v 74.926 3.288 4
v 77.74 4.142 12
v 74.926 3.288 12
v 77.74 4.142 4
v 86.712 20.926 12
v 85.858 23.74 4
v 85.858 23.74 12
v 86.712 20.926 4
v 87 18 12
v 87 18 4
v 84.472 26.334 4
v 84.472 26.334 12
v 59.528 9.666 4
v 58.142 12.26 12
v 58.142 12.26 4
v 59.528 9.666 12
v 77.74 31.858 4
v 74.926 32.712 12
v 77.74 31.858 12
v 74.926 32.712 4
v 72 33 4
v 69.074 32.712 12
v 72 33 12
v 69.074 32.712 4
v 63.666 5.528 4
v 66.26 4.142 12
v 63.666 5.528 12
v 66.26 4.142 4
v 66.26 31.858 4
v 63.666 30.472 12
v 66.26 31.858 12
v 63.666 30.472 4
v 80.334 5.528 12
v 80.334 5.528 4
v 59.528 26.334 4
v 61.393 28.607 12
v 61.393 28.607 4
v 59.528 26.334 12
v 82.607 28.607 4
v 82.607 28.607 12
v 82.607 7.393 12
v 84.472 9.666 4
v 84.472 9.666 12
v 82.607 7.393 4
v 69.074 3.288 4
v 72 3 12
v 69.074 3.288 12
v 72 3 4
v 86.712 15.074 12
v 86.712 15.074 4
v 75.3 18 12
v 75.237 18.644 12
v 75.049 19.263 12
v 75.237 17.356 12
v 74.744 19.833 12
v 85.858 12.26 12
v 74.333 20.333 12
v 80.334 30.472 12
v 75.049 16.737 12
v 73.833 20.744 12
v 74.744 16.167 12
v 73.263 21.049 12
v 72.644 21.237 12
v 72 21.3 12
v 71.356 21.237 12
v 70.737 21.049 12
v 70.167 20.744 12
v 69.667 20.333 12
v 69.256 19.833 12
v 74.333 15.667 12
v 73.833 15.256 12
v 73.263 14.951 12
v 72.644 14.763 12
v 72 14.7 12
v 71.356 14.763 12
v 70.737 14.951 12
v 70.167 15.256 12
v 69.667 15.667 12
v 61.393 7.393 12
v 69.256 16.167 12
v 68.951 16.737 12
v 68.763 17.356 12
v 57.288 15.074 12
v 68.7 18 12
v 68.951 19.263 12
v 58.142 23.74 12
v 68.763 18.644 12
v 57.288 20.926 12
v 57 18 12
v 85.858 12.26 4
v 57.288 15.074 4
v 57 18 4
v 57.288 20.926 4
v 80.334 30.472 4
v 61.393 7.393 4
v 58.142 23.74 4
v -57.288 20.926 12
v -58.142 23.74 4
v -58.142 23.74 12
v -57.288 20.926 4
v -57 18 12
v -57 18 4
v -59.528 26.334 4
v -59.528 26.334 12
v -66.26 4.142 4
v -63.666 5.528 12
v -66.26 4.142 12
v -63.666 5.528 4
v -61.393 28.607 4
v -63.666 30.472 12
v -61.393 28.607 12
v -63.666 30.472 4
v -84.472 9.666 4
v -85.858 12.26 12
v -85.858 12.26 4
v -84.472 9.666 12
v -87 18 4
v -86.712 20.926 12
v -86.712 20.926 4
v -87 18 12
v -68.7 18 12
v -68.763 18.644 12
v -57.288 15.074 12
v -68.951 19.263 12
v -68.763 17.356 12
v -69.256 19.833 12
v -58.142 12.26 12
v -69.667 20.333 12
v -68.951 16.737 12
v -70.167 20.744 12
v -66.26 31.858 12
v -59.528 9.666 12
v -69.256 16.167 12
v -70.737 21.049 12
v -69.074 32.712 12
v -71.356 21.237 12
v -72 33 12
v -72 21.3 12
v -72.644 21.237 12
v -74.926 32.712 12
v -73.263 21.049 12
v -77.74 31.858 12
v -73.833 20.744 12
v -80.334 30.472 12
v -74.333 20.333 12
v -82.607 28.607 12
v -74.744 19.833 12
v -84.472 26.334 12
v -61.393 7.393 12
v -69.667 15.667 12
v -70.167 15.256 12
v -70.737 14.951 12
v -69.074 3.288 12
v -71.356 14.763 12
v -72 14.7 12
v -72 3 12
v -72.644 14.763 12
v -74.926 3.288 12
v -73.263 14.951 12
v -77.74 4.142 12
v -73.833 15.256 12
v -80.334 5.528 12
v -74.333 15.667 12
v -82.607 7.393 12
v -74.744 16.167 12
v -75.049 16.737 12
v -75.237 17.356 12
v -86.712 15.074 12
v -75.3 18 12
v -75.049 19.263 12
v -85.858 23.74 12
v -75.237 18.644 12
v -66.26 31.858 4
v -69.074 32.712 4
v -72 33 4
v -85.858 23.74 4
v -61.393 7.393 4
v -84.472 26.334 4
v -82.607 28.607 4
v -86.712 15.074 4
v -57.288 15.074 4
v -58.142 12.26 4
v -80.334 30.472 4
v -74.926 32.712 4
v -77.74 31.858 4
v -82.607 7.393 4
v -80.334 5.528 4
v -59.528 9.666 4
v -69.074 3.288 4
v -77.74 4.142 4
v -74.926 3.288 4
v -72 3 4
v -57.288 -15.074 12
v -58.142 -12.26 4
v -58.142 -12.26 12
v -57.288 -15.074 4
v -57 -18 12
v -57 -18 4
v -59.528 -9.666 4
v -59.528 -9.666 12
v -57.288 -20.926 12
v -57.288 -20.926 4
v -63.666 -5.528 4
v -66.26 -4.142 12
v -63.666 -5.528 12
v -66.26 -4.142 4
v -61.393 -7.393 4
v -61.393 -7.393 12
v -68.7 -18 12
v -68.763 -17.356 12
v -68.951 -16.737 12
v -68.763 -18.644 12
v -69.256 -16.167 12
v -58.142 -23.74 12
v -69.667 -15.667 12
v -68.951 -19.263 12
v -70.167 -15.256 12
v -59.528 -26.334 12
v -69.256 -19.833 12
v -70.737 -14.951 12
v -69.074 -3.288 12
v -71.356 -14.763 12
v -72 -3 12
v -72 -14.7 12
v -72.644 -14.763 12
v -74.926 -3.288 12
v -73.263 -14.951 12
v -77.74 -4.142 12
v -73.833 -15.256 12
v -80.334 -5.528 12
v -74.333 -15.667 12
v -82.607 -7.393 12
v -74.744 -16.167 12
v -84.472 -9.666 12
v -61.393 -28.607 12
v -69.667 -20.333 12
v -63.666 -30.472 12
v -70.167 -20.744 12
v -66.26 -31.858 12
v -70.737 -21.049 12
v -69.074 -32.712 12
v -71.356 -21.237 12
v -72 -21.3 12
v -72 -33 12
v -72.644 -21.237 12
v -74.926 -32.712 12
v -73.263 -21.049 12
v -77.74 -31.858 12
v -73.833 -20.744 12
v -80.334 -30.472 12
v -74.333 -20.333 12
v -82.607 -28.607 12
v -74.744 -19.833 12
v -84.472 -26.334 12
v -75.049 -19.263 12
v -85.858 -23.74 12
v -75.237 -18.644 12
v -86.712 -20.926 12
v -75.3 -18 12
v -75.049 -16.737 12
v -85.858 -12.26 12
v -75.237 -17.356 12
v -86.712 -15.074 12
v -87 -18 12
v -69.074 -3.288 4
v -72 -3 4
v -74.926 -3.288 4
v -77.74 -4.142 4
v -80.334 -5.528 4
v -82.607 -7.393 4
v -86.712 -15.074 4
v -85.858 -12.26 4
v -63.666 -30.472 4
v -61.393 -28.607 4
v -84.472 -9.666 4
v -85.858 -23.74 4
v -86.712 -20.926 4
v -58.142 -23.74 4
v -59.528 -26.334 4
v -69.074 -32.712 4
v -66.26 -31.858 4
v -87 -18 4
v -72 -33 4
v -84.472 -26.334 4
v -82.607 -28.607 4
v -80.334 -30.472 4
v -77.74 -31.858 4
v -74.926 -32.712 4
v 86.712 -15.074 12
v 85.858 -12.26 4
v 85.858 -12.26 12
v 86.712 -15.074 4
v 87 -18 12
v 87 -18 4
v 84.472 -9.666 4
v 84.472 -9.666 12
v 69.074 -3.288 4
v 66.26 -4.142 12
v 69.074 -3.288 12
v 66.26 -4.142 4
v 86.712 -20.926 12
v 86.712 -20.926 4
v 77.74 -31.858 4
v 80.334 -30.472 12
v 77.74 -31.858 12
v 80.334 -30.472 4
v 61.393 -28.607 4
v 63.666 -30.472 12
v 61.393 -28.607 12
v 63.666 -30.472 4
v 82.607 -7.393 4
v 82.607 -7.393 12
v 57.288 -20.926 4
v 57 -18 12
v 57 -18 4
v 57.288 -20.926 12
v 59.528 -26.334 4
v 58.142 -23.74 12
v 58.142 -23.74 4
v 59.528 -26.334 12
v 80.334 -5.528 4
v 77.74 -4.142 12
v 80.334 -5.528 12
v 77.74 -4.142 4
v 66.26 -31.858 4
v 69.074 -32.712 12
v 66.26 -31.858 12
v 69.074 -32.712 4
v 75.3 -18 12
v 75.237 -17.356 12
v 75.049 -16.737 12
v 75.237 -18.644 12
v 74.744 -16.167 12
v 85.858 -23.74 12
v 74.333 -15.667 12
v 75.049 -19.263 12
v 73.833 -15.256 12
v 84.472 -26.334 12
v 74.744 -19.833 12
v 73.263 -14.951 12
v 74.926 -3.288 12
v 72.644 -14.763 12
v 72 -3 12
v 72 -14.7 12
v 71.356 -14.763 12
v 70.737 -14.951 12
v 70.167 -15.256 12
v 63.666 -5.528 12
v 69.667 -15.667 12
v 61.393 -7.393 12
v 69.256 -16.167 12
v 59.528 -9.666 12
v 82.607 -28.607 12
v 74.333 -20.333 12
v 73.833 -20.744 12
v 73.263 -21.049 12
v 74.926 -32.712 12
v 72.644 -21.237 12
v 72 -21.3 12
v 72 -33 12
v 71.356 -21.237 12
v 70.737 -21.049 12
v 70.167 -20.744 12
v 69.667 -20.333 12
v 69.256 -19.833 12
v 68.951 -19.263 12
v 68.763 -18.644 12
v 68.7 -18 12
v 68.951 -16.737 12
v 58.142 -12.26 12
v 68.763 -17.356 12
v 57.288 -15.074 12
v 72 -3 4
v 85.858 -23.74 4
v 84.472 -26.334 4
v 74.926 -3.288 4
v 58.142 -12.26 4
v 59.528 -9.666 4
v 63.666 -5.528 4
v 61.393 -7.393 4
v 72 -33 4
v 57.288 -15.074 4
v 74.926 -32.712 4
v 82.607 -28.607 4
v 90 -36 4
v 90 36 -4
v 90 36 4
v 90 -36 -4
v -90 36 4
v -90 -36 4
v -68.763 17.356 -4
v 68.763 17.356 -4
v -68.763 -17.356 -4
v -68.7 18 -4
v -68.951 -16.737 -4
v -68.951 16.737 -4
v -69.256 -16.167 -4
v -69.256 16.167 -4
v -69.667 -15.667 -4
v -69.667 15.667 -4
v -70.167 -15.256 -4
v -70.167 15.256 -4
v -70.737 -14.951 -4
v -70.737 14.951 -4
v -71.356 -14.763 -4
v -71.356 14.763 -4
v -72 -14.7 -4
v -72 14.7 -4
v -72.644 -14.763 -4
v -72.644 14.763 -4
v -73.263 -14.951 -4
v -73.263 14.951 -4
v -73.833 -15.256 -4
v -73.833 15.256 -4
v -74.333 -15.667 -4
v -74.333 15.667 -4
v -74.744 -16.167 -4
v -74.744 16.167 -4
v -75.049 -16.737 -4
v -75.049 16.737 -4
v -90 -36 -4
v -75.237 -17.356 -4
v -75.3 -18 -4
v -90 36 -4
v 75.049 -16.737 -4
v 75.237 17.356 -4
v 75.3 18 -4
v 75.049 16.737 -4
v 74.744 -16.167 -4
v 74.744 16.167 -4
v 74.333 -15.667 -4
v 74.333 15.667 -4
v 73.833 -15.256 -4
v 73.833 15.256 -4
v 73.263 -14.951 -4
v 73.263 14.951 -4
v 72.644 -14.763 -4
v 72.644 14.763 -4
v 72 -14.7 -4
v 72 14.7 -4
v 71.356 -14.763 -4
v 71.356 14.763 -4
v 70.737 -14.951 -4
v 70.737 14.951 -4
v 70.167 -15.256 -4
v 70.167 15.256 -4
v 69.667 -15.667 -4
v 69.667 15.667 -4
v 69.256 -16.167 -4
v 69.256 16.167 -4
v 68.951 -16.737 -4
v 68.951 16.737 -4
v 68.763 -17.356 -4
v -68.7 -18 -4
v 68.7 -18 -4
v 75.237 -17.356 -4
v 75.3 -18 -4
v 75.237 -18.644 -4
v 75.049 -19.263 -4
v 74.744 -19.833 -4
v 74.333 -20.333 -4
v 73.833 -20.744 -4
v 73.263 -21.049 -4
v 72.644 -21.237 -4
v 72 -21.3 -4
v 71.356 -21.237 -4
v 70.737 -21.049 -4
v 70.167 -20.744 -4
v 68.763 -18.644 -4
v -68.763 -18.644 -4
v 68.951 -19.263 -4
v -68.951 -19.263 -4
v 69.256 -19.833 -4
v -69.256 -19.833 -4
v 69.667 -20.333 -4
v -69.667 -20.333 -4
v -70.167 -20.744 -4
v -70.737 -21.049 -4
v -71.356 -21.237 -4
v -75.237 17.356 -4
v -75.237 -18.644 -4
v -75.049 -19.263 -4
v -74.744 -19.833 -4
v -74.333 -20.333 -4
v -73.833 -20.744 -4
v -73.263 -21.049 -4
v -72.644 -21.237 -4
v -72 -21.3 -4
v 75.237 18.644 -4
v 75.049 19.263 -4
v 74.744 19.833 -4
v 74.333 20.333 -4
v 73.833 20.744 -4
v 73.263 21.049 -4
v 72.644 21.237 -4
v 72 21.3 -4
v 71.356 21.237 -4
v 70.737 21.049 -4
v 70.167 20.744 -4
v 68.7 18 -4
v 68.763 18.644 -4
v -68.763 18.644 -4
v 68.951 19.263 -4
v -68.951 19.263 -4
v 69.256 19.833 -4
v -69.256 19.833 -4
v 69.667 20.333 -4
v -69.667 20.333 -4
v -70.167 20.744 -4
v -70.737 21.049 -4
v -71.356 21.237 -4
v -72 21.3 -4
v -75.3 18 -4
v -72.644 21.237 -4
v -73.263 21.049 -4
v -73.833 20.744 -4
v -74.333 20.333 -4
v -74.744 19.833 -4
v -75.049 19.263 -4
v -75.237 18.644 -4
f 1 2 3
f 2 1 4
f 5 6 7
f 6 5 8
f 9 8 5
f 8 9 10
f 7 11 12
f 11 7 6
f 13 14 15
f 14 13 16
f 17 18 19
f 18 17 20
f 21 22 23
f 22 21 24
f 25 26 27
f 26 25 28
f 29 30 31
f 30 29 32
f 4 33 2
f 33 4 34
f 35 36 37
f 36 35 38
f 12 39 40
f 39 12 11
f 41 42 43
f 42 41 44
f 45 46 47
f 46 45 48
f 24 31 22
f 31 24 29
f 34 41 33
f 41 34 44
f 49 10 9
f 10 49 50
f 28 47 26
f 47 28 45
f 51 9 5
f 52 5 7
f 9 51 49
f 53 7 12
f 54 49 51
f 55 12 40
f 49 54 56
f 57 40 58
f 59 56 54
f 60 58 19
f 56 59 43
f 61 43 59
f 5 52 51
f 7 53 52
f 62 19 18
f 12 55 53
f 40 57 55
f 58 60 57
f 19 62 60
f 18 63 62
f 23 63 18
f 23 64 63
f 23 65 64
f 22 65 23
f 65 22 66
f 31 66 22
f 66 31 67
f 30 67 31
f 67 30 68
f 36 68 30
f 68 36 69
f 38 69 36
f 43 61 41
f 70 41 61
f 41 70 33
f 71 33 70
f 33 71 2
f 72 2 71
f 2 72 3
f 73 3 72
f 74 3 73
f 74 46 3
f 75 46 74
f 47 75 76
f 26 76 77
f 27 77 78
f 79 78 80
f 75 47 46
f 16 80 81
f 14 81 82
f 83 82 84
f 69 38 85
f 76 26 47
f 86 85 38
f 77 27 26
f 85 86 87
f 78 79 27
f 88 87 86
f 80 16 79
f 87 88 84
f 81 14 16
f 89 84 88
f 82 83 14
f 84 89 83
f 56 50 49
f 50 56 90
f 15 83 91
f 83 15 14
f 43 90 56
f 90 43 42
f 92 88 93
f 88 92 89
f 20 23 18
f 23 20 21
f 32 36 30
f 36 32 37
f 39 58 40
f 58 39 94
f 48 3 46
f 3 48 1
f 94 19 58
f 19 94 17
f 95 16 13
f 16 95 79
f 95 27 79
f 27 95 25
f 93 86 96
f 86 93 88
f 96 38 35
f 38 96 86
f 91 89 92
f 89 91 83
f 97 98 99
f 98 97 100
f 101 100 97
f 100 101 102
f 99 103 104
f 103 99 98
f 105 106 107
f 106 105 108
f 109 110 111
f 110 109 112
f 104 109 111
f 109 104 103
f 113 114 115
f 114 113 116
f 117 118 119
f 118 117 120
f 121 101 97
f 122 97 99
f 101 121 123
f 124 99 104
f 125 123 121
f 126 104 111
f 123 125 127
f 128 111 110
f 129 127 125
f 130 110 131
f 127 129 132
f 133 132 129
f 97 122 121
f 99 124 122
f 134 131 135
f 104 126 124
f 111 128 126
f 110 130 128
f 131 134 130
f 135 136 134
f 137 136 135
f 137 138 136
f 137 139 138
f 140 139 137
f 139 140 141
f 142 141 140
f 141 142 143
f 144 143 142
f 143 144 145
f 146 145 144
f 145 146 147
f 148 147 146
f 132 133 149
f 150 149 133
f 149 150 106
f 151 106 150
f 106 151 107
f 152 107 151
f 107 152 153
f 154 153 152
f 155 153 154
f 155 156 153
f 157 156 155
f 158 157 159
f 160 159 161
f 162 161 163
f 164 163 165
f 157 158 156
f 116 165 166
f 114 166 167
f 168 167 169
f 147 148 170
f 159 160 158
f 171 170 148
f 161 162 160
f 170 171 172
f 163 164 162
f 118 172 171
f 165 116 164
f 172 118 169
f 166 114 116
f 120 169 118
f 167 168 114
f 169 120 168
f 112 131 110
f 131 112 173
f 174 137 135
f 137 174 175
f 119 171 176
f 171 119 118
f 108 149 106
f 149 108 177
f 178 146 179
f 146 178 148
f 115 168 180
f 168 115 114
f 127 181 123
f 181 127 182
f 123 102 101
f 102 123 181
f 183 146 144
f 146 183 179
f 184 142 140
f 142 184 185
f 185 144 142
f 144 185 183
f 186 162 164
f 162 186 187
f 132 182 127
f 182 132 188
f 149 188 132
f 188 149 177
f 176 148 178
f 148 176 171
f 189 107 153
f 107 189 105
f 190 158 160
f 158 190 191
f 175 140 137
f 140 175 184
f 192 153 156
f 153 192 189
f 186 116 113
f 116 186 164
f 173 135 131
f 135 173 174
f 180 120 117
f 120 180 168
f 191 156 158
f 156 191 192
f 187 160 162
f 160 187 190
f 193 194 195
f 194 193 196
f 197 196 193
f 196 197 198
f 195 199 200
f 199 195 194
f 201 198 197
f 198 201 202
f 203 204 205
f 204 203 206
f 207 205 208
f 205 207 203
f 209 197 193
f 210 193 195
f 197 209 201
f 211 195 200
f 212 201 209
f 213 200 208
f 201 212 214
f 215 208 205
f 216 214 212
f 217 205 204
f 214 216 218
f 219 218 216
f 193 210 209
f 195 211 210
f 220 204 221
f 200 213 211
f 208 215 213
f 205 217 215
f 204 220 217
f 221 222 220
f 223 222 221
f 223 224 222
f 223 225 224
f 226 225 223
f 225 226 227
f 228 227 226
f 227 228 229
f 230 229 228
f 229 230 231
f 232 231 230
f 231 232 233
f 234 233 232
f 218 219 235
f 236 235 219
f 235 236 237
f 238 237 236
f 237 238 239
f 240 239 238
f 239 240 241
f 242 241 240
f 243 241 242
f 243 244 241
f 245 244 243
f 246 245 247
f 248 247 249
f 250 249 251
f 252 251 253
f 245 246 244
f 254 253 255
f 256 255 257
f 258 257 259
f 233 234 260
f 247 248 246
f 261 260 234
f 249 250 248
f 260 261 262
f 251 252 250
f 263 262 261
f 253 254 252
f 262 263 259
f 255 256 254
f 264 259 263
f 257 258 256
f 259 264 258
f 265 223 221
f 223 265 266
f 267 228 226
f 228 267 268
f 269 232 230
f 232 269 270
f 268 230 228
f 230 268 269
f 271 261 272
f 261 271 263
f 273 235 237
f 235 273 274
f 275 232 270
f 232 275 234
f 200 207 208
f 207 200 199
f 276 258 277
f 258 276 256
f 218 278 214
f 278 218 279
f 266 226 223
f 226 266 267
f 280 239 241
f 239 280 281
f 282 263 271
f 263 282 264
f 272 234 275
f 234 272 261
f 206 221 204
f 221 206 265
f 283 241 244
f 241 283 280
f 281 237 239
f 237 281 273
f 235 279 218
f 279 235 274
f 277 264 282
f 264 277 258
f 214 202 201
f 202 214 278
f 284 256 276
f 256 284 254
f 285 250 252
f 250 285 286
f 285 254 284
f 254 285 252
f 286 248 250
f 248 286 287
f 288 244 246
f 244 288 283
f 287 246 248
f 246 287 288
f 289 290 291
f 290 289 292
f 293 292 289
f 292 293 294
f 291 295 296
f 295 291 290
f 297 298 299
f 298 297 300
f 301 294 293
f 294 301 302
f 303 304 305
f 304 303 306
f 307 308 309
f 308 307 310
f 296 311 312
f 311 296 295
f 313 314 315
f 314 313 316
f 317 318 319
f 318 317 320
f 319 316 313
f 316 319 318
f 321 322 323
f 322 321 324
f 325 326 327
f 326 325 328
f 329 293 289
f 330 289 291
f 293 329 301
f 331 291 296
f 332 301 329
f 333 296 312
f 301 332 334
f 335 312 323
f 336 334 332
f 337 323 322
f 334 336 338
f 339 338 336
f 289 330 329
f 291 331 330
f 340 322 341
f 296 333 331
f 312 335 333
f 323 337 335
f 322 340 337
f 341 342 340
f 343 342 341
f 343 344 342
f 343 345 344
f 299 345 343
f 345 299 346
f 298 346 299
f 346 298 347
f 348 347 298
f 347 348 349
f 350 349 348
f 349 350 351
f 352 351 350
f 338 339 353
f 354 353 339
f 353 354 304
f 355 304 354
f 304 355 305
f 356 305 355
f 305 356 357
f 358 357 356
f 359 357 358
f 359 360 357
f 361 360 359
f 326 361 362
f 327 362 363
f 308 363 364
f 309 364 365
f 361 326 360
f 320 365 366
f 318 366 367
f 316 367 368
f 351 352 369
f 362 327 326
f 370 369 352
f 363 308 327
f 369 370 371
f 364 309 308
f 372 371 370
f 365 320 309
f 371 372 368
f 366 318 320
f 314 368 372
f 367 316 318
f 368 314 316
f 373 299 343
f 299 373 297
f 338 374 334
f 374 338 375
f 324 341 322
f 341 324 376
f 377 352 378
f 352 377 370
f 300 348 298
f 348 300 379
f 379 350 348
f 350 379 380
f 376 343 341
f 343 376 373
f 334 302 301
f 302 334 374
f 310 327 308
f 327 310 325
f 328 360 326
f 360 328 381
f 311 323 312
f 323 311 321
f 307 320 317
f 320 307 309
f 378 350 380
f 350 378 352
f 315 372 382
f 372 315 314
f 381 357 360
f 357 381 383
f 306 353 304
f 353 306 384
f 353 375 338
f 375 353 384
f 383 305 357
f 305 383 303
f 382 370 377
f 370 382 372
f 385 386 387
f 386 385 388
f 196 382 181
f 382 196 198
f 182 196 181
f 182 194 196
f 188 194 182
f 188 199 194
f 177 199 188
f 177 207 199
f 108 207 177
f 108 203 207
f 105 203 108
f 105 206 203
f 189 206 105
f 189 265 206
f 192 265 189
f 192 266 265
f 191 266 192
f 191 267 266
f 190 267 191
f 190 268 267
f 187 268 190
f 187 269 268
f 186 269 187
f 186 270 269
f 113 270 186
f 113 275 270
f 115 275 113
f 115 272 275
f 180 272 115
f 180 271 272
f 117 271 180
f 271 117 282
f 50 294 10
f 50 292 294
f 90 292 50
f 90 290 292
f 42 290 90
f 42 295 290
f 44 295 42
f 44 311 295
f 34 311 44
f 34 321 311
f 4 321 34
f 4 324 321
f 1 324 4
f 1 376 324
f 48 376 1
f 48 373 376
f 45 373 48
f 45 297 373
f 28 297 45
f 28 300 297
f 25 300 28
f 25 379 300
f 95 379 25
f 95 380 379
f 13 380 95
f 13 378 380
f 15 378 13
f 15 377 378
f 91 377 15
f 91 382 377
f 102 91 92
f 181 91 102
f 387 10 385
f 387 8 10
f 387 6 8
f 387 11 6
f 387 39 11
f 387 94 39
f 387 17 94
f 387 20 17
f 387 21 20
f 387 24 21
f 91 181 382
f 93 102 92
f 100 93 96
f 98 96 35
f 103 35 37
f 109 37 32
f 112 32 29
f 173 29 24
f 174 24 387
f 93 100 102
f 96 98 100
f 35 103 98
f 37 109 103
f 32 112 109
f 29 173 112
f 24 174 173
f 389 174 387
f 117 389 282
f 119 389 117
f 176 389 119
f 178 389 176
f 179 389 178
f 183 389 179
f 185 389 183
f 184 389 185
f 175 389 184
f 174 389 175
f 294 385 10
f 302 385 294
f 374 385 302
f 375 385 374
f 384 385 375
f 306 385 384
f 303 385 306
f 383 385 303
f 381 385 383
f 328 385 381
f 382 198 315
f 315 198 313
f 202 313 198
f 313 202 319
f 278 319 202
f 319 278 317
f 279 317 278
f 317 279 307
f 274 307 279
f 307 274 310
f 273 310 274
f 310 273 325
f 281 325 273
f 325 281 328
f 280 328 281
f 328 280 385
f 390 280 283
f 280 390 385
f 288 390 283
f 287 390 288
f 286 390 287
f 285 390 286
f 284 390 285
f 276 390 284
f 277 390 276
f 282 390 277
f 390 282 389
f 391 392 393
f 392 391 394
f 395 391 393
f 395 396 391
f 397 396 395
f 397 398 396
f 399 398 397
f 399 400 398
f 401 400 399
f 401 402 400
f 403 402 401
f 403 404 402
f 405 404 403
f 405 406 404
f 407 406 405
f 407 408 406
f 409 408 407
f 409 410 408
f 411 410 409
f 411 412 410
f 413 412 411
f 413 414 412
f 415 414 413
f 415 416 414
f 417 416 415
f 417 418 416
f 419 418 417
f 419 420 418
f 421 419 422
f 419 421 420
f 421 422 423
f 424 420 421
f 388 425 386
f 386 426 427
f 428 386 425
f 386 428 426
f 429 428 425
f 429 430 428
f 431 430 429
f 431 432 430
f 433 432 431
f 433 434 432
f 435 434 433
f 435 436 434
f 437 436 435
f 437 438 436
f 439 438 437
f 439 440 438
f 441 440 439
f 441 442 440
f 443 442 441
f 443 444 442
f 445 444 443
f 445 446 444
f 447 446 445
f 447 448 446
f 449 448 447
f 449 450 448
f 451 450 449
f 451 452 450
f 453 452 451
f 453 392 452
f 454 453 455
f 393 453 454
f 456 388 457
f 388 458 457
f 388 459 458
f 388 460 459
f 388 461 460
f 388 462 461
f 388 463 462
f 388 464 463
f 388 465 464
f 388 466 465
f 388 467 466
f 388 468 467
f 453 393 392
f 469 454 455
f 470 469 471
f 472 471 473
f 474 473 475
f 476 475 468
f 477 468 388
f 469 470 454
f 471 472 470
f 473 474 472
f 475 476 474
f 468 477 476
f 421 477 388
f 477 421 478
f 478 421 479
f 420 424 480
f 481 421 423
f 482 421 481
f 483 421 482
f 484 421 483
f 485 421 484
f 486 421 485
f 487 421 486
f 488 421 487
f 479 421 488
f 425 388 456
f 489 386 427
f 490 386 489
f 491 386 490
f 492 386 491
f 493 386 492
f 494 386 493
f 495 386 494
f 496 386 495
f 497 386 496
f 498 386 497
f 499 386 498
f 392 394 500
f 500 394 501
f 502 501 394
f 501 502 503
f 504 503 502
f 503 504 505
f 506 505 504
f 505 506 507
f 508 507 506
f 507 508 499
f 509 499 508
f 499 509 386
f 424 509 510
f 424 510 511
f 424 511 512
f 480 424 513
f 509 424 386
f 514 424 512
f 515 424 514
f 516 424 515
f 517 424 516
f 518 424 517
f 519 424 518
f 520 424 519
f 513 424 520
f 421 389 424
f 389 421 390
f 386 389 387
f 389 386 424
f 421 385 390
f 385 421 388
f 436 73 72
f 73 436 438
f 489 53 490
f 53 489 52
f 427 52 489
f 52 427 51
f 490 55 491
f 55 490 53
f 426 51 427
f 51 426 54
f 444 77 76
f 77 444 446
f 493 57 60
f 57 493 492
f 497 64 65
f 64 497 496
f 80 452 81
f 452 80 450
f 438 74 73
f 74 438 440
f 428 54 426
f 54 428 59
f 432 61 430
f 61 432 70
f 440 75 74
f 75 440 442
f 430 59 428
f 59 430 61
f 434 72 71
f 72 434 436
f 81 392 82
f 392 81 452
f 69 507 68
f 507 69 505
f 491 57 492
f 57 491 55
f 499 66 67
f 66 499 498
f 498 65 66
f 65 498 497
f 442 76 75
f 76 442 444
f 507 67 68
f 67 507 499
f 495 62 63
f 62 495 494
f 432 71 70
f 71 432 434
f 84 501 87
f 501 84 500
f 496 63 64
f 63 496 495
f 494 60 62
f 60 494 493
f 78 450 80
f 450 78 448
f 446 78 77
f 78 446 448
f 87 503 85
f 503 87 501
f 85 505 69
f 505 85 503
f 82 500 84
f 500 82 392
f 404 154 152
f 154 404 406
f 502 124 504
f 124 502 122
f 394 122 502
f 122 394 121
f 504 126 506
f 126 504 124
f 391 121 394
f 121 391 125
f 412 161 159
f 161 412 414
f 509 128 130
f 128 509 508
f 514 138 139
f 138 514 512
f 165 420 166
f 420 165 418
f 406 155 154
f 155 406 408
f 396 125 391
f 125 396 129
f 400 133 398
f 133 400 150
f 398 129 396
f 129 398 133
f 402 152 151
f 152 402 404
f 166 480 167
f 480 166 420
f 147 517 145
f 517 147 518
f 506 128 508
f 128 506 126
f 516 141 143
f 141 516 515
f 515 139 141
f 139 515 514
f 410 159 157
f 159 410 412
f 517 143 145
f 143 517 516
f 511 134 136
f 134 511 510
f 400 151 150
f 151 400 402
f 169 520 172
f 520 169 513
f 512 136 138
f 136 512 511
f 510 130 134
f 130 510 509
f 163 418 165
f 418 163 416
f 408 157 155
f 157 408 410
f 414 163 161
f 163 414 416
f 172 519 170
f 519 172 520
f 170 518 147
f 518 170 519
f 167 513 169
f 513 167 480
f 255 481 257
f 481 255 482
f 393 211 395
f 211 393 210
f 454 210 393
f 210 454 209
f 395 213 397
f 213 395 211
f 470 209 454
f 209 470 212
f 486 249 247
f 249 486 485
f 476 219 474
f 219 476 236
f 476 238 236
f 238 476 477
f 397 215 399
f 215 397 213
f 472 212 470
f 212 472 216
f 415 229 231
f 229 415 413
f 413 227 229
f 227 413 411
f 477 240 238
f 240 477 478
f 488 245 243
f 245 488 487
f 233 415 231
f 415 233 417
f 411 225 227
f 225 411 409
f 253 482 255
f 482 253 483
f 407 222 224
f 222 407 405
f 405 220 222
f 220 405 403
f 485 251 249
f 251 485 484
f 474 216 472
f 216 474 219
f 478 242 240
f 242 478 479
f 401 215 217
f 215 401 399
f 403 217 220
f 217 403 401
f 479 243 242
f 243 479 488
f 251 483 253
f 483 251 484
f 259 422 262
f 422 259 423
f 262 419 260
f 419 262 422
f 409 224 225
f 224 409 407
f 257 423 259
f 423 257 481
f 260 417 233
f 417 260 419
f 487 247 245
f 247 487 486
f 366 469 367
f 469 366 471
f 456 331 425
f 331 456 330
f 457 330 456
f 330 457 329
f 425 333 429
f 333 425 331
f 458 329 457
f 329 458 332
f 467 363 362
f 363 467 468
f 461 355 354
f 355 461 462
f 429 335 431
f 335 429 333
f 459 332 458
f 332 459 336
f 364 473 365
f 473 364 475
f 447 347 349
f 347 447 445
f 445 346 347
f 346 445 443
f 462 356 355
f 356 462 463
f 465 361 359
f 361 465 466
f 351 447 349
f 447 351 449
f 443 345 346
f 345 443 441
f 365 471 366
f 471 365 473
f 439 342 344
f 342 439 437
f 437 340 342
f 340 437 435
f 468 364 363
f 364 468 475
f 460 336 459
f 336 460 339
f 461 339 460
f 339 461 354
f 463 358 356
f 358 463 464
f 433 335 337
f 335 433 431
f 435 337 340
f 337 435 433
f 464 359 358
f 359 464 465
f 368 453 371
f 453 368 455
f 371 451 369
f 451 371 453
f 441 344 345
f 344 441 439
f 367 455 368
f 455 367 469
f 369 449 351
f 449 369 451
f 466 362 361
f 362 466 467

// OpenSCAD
$fn = 32;

// ----------------------------------------------------------------------
// Anchor pads 180 x 72 x 16
// four corner bosses with anchor holes
// ----------------------------------------------------------------------

// --- parameters (mm) ---
plate = [180, 72, 8];  // base plate size (x, y, z)
pads = 4;              // boss count, one per corner
edge = 18;             // boss centre offset from the plate edge
boss_d = 30;           // boss diameter
boss_h = 8;            // boss height above the base plate
hole_d = 6.6;          // hole diameter

// --- derived feature positions (mm) ---
height = plate[2] + boss_h;      // = 16   overall height of the part
corner_x = plate[0] / 2 - edge;  // = 72   boss centre X
corner_y = plate[1] / 2 - edge;  // = 18   boss centre Y
feature_centers = [
  [corner_x, corner_y],
  [-corner_x, corner_y],
  [-corner_x, -corner_y],
  [corner_x, -corner_y]
];   // boss centres, anchor holes are drilled there

// base plate, four bosses standing on it, anchor holes all the way through
difference() {
  union() {
    cube(plate, center = true);
    for (centre = feature_centers)
      translate([centre[0], centre[1], plate[2] / 2 - 1])
        cylinder(d = boss_d, h = boss_h + 1);
  }
  for (centre = feature_centers)
    translate([centre[0], centre[1], -height])
      cylinder(d = hole_d, h = 2 * height + 2);  // through boss and plate
}
